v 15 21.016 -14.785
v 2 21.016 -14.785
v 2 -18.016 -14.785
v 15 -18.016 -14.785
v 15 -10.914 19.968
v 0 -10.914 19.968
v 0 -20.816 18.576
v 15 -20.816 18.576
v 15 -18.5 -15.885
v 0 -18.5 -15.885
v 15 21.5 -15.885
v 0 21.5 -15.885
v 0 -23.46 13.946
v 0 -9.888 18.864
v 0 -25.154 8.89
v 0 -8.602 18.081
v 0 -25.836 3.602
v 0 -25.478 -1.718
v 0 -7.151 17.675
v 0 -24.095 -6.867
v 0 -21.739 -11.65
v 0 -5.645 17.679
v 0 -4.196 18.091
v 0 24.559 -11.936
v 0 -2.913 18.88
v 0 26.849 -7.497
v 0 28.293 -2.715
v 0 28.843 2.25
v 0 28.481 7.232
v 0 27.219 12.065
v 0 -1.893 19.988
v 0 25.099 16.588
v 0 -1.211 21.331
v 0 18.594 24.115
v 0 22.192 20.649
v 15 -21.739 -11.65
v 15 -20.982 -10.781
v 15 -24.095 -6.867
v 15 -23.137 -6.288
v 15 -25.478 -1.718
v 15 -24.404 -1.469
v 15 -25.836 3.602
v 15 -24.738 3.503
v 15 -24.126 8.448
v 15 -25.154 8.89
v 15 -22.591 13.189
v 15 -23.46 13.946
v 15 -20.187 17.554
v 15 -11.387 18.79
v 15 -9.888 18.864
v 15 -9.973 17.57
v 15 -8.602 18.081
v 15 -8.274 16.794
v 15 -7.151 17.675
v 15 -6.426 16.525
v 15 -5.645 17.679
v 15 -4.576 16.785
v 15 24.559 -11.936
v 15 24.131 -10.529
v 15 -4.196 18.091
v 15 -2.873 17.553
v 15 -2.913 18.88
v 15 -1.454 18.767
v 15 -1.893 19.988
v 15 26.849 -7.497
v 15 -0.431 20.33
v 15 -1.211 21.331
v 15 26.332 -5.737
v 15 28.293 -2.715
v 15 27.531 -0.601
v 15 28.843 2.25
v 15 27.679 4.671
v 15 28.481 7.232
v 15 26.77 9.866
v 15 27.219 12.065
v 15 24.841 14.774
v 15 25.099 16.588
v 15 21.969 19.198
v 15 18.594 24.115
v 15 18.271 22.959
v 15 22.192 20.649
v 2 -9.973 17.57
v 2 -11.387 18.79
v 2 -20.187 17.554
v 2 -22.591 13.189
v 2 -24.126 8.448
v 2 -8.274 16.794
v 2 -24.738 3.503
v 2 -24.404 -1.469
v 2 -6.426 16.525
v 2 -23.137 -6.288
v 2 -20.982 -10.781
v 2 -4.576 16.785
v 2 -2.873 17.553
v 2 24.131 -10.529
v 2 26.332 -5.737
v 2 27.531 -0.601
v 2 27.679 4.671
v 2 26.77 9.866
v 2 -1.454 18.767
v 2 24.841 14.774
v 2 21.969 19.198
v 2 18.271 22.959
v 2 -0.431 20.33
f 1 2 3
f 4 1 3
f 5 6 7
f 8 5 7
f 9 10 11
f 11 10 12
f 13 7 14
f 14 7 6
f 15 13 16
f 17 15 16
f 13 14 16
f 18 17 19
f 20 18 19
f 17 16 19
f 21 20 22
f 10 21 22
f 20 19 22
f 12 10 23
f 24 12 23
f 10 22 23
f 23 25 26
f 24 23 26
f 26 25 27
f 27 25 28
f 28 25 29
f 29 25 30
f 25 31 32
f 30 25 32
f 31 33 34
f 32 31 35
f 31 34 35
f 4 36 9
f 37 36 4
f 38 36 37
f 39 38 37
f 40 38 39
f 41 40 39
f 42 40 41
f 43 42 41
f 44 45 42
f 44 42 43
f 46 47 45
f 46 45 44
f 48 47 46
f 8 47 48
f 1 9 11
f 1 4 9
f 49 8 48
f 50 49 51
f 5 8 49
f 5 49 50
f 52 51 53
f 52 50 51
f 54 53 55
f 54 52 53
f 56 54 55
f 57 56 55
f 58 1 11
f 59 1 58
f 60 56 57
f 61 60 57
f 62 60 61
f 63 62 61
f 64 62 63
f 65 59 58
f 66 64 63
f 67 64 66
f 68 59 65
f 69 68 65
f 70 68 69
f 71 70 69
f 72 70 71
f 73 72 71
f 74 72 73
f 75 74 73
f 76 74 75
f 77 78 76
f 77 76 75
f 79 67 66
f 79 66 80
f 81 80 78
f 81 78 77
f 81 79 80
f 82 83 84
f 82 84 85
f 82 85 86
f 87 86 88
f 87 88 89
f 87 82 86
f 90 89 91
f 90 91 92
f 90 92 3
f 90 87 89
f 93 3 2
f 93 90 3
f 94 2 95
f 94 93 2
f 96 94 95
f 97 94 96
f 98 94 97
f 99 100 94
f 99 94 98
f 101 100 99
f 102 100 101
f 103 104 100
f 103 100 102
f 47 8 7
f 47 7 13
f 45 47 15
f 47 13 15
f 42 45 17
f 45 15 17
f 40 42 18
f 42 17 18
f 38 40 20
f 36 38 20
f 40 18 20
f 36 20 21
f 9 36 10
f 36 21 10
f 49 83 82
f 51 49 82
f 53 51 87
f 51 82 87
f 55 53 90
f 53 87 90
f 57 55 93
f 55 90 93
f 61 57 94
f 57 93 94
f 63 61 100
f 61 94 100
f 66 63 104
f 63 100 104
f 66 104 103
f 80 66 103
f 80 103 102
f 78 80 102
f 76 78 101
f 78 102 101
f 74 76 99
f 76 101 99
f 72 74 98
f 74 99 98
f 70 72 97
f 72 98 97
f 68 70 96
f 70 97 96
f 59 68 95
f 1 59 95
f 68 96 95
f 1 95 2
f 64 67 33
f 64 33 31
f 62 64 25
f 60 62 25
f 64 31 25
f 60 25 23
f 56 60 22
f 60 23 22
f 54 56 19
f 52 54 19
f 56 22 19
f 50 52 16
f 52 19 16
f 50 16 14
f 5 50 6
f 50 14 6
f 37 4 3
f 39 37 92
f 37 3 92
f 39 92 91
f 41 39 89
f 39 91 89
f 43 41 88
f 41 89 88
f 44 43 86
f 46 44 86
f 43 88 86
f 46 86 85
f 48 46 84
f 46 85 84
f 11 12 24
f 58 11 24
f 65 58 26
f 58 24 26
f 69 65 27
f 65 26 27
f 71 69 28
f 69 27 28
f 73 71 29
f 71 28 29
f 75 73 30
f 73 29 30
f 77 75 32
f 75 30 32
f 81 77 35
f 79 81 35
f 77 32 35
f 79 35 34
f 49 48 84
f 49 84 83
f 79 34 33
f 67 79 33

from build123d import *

# Parameters (mm, degrees)
F1_DEPTH = 15
F2_DEPTH = 2


with BuildPart() as f1:
    # F0 (on Right) → F1 (new body)
    with BuildSketch(Plane.YZ):
        with BuildLine():
            Line((-18.500151, -15.885202), (21.499849, -15.885202))
            ThreePointArc((21.499849, -15.885202), (28.776178, 4.748888), (18.594223, 24.114798))
            Line((18.594223, 24.114798), (-1.211139, 21.331336))
            ThreePointArc((-1.211139, 21.331336), (-5.644923, 17.678725), (-10.913745, 19.967723))
            Line((-10.913745, 19.967723), (-20.816425, 18.575992))
            ThreePointArc((-20.816425, 18.575992), (-25.786783, 0.933475), (-18.500151, -15.885202))
        make_face()
        with BuildLine():
            ThreePointArc((-18.016041, -14.785202), (-24.689377, 1.008996), (-20.187486, 17.553574))
            Line((-20.187486, 17.553574), (-11.387244, 18.790367))
            ThreePointArc((-11.387244, 18.790367), (-5.491832, 16.589431), (-0.431459, 20.330102))
            Line((-0.431459, 20.330102), (18.271464, 22.958627))
            ThreePointArc((18.271464, 22.958627), (27.678942, 4.670945), (21.015738, -14.785202))
            Line((21.015738, -14.785202), (-18.016041, -14.785202))
        make_face(mode=Mode.SUBTRACT)
    extrude(amount=F1_DEPTH)

    # F0 (on Right) → F2 (join)
    with BuildSketch(Plane.YZ):
        with BuildLine():
            Line((-11.387244, 18.790367), (-20.187486, 17.553574))
            ThreePointArc((-20.187486, 17.553574), (-24.689377, 1.008996), (-18.016041, -14.785202))
            Line((-18.016041, -14.785202), (21.015738, -14.785202))
            ThreePointArc((21.015738, -14.785202), (27.678942, 4.670945), (18.271464, 22.958627))
            Line((18.271464, 22.958627), (-0.431459, 20.330102))
            ThreePointArc((-0.431459, 20.330102), (-5.491832, 16.589431), (-11.387244, 18.790367))
        make_face()
    extrude(amount=F2_DEPTH)


solid = f1.part
